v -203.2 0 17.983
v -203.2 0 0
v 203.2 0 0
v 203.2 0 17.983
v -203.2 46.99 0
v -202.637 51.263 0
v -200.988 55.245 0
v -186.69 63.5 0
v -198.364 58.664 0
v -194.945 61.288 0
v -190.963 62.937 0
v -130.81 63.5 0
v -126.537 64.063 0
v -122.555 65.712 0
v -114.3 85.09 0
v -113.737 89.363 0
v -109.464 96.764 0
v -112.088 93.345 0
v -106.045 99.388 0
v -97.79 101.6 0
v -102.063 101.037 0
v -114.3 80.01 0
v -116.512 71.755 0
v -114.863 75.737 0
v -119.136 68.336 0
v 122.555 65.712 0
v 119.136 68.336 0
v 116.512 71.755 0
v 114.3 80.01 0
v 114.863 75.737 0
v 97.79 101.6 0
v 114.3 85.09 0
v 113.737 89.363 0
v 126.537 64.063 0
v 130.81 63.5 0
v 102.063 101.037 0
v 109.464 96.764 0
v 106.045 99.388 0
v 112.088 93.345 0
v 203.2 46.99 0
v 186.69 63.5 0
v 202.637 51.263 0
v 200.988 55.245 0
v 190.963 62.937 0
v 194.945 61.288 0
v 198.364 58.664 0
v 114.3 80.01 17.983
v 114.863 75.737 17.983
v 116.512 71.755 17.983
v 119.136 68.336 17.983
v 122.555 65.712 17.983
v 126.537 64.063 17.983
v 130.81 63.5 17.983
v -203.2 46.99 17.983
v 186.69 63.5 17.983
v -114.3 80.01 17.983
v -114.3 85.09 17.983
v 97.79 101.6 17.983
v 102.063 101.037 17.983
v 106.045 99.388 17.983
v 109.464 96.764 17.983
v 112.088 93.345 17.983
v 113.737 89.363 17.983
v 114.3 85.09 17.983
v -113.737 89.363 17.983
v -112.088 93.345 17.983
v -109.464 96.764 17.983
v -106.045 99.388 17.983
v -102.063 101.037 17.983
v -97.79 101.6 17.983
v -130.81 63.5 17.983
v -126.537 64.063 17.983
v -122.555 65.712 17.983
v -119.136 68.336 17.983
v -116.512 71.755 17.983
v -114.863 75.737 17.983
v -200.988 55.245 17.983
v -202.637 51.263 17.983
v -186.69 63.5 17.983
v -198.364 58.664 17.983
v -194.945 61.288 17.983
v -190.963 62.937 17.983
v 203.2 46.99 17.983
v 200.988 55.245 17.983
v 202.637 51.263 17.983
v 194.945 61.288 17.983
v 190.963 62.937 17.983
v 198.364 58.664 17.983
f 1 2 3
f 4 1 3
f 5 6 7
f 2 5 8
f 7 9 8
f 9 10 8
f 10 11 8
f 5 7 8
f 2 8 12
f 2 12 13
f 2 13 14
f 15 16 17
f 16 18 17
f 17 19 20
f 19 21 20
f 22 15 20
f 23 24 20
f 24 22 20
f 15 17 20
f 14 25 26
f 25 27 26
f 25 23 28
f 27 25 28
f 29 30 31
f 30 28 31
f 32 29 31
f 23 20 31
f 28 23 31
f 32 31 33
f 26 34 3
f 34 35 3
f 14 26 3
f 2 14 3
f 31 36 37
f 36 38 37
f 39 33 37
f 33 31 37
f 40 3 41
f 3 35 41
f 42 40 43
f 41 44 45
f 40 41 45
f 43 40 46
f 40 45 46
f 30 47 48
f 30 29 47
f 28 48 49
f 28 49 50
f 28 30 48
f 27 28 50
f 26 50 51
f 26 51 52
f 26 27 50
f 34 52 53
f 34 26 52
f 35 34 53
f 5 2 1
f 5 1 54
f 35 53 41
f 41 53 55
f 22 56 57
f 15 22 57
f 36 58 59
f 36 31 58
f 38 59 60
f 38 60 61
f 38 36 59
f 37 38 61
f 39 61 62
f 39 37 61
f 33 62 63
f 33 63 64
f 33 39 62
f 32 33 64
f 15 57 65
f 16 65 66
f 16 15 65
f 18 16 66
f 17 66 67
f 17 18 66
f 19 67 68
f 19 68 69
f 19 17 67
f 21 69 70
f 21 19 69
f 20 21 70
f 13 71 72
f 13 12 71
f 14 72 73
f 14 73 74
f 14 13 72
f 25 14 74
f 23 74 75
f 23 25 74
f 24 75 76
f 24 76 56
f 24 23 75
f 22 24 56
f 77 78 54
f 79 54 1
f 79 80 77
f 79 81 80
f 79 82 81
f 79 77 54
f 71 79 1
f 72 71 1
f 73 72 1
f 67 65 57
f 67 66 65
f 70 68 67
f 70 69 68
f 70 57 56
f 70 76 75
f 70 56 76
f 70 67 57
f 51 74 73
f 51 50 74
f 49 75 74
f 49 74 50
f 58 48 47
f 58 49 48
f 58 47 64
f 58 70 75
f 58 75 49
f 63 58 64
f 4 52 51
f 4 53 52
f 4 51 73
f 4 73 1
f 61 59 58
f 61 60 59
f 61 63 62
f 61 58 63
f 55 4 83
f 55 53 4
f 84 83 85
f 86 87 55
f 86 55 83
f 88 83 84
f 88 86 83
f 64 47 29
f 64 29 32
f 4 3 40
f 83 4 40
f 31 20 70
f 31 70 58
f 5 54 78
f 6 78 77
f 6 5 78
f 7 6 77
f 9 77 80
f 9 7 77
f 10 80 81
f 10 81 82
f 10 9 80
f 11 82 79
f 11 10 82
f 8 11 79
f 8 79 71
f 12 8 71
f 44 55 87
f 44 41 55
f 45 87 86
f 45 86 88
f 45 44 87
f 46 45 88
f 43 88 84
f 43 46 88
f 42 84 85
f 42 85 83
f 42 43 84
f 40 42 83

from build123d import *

# Parameters (mm, degrees)
SKETCH1_W           = 406.4
SKETCH1_H           = 101.6
BOSS_EXTRUDE1_DEPTH = 17.9832
SKETCH2_W           = 88.9
SKETCH2_H           = 38.1
CUT_EXTRUDE1_DEPTH  = 228.895141419
FILLET1_R           = 16.51


with BuildPart() as part:
    # Sketch1 → Boss-Extrude1 (new body)
    with BuildSketch(Plane.XY):
        with Locations((0, 50.8)):
            Rectangle(SKETCH1_W, SKETCH1_H)
    extrude(amount=BOSS_EXTRUDE1_DEPTH)

    # Sketch2 → Cut-Extrude1 (cut, through all)
    with BuildSketch(Plane.XY.offset(17.9832)):
        with Locations((-158.75, 82.55)):
            Rectangle(SKETCH2_W, SKETCH2_H)
        with Locations((158.75, 82.55)):
            Rectangle(SKETCH2_W, SKETCH2_H)
    extrude(amount=-CUT_EXTRUDE1_DEPTH, mode=Mode.SUBTRACT)

    # Fillet1
    fillet1_edges = [part.edges().sort_by_distance(p)[0] for p in [
        (-203.2, 63.5, 8.9916),
        (-114.3, 101.6, 8.9916),
        (-114.3, 63.5, 8.9916),
        (203.2, 63.5, 8.9916),
        (114.3, 63.5, 8.9916),
        (114.3, 101.6, 8.9916),
    ]]
    fillet(fillet1_edges, radius=FILLET1_R)


solid = part.part
